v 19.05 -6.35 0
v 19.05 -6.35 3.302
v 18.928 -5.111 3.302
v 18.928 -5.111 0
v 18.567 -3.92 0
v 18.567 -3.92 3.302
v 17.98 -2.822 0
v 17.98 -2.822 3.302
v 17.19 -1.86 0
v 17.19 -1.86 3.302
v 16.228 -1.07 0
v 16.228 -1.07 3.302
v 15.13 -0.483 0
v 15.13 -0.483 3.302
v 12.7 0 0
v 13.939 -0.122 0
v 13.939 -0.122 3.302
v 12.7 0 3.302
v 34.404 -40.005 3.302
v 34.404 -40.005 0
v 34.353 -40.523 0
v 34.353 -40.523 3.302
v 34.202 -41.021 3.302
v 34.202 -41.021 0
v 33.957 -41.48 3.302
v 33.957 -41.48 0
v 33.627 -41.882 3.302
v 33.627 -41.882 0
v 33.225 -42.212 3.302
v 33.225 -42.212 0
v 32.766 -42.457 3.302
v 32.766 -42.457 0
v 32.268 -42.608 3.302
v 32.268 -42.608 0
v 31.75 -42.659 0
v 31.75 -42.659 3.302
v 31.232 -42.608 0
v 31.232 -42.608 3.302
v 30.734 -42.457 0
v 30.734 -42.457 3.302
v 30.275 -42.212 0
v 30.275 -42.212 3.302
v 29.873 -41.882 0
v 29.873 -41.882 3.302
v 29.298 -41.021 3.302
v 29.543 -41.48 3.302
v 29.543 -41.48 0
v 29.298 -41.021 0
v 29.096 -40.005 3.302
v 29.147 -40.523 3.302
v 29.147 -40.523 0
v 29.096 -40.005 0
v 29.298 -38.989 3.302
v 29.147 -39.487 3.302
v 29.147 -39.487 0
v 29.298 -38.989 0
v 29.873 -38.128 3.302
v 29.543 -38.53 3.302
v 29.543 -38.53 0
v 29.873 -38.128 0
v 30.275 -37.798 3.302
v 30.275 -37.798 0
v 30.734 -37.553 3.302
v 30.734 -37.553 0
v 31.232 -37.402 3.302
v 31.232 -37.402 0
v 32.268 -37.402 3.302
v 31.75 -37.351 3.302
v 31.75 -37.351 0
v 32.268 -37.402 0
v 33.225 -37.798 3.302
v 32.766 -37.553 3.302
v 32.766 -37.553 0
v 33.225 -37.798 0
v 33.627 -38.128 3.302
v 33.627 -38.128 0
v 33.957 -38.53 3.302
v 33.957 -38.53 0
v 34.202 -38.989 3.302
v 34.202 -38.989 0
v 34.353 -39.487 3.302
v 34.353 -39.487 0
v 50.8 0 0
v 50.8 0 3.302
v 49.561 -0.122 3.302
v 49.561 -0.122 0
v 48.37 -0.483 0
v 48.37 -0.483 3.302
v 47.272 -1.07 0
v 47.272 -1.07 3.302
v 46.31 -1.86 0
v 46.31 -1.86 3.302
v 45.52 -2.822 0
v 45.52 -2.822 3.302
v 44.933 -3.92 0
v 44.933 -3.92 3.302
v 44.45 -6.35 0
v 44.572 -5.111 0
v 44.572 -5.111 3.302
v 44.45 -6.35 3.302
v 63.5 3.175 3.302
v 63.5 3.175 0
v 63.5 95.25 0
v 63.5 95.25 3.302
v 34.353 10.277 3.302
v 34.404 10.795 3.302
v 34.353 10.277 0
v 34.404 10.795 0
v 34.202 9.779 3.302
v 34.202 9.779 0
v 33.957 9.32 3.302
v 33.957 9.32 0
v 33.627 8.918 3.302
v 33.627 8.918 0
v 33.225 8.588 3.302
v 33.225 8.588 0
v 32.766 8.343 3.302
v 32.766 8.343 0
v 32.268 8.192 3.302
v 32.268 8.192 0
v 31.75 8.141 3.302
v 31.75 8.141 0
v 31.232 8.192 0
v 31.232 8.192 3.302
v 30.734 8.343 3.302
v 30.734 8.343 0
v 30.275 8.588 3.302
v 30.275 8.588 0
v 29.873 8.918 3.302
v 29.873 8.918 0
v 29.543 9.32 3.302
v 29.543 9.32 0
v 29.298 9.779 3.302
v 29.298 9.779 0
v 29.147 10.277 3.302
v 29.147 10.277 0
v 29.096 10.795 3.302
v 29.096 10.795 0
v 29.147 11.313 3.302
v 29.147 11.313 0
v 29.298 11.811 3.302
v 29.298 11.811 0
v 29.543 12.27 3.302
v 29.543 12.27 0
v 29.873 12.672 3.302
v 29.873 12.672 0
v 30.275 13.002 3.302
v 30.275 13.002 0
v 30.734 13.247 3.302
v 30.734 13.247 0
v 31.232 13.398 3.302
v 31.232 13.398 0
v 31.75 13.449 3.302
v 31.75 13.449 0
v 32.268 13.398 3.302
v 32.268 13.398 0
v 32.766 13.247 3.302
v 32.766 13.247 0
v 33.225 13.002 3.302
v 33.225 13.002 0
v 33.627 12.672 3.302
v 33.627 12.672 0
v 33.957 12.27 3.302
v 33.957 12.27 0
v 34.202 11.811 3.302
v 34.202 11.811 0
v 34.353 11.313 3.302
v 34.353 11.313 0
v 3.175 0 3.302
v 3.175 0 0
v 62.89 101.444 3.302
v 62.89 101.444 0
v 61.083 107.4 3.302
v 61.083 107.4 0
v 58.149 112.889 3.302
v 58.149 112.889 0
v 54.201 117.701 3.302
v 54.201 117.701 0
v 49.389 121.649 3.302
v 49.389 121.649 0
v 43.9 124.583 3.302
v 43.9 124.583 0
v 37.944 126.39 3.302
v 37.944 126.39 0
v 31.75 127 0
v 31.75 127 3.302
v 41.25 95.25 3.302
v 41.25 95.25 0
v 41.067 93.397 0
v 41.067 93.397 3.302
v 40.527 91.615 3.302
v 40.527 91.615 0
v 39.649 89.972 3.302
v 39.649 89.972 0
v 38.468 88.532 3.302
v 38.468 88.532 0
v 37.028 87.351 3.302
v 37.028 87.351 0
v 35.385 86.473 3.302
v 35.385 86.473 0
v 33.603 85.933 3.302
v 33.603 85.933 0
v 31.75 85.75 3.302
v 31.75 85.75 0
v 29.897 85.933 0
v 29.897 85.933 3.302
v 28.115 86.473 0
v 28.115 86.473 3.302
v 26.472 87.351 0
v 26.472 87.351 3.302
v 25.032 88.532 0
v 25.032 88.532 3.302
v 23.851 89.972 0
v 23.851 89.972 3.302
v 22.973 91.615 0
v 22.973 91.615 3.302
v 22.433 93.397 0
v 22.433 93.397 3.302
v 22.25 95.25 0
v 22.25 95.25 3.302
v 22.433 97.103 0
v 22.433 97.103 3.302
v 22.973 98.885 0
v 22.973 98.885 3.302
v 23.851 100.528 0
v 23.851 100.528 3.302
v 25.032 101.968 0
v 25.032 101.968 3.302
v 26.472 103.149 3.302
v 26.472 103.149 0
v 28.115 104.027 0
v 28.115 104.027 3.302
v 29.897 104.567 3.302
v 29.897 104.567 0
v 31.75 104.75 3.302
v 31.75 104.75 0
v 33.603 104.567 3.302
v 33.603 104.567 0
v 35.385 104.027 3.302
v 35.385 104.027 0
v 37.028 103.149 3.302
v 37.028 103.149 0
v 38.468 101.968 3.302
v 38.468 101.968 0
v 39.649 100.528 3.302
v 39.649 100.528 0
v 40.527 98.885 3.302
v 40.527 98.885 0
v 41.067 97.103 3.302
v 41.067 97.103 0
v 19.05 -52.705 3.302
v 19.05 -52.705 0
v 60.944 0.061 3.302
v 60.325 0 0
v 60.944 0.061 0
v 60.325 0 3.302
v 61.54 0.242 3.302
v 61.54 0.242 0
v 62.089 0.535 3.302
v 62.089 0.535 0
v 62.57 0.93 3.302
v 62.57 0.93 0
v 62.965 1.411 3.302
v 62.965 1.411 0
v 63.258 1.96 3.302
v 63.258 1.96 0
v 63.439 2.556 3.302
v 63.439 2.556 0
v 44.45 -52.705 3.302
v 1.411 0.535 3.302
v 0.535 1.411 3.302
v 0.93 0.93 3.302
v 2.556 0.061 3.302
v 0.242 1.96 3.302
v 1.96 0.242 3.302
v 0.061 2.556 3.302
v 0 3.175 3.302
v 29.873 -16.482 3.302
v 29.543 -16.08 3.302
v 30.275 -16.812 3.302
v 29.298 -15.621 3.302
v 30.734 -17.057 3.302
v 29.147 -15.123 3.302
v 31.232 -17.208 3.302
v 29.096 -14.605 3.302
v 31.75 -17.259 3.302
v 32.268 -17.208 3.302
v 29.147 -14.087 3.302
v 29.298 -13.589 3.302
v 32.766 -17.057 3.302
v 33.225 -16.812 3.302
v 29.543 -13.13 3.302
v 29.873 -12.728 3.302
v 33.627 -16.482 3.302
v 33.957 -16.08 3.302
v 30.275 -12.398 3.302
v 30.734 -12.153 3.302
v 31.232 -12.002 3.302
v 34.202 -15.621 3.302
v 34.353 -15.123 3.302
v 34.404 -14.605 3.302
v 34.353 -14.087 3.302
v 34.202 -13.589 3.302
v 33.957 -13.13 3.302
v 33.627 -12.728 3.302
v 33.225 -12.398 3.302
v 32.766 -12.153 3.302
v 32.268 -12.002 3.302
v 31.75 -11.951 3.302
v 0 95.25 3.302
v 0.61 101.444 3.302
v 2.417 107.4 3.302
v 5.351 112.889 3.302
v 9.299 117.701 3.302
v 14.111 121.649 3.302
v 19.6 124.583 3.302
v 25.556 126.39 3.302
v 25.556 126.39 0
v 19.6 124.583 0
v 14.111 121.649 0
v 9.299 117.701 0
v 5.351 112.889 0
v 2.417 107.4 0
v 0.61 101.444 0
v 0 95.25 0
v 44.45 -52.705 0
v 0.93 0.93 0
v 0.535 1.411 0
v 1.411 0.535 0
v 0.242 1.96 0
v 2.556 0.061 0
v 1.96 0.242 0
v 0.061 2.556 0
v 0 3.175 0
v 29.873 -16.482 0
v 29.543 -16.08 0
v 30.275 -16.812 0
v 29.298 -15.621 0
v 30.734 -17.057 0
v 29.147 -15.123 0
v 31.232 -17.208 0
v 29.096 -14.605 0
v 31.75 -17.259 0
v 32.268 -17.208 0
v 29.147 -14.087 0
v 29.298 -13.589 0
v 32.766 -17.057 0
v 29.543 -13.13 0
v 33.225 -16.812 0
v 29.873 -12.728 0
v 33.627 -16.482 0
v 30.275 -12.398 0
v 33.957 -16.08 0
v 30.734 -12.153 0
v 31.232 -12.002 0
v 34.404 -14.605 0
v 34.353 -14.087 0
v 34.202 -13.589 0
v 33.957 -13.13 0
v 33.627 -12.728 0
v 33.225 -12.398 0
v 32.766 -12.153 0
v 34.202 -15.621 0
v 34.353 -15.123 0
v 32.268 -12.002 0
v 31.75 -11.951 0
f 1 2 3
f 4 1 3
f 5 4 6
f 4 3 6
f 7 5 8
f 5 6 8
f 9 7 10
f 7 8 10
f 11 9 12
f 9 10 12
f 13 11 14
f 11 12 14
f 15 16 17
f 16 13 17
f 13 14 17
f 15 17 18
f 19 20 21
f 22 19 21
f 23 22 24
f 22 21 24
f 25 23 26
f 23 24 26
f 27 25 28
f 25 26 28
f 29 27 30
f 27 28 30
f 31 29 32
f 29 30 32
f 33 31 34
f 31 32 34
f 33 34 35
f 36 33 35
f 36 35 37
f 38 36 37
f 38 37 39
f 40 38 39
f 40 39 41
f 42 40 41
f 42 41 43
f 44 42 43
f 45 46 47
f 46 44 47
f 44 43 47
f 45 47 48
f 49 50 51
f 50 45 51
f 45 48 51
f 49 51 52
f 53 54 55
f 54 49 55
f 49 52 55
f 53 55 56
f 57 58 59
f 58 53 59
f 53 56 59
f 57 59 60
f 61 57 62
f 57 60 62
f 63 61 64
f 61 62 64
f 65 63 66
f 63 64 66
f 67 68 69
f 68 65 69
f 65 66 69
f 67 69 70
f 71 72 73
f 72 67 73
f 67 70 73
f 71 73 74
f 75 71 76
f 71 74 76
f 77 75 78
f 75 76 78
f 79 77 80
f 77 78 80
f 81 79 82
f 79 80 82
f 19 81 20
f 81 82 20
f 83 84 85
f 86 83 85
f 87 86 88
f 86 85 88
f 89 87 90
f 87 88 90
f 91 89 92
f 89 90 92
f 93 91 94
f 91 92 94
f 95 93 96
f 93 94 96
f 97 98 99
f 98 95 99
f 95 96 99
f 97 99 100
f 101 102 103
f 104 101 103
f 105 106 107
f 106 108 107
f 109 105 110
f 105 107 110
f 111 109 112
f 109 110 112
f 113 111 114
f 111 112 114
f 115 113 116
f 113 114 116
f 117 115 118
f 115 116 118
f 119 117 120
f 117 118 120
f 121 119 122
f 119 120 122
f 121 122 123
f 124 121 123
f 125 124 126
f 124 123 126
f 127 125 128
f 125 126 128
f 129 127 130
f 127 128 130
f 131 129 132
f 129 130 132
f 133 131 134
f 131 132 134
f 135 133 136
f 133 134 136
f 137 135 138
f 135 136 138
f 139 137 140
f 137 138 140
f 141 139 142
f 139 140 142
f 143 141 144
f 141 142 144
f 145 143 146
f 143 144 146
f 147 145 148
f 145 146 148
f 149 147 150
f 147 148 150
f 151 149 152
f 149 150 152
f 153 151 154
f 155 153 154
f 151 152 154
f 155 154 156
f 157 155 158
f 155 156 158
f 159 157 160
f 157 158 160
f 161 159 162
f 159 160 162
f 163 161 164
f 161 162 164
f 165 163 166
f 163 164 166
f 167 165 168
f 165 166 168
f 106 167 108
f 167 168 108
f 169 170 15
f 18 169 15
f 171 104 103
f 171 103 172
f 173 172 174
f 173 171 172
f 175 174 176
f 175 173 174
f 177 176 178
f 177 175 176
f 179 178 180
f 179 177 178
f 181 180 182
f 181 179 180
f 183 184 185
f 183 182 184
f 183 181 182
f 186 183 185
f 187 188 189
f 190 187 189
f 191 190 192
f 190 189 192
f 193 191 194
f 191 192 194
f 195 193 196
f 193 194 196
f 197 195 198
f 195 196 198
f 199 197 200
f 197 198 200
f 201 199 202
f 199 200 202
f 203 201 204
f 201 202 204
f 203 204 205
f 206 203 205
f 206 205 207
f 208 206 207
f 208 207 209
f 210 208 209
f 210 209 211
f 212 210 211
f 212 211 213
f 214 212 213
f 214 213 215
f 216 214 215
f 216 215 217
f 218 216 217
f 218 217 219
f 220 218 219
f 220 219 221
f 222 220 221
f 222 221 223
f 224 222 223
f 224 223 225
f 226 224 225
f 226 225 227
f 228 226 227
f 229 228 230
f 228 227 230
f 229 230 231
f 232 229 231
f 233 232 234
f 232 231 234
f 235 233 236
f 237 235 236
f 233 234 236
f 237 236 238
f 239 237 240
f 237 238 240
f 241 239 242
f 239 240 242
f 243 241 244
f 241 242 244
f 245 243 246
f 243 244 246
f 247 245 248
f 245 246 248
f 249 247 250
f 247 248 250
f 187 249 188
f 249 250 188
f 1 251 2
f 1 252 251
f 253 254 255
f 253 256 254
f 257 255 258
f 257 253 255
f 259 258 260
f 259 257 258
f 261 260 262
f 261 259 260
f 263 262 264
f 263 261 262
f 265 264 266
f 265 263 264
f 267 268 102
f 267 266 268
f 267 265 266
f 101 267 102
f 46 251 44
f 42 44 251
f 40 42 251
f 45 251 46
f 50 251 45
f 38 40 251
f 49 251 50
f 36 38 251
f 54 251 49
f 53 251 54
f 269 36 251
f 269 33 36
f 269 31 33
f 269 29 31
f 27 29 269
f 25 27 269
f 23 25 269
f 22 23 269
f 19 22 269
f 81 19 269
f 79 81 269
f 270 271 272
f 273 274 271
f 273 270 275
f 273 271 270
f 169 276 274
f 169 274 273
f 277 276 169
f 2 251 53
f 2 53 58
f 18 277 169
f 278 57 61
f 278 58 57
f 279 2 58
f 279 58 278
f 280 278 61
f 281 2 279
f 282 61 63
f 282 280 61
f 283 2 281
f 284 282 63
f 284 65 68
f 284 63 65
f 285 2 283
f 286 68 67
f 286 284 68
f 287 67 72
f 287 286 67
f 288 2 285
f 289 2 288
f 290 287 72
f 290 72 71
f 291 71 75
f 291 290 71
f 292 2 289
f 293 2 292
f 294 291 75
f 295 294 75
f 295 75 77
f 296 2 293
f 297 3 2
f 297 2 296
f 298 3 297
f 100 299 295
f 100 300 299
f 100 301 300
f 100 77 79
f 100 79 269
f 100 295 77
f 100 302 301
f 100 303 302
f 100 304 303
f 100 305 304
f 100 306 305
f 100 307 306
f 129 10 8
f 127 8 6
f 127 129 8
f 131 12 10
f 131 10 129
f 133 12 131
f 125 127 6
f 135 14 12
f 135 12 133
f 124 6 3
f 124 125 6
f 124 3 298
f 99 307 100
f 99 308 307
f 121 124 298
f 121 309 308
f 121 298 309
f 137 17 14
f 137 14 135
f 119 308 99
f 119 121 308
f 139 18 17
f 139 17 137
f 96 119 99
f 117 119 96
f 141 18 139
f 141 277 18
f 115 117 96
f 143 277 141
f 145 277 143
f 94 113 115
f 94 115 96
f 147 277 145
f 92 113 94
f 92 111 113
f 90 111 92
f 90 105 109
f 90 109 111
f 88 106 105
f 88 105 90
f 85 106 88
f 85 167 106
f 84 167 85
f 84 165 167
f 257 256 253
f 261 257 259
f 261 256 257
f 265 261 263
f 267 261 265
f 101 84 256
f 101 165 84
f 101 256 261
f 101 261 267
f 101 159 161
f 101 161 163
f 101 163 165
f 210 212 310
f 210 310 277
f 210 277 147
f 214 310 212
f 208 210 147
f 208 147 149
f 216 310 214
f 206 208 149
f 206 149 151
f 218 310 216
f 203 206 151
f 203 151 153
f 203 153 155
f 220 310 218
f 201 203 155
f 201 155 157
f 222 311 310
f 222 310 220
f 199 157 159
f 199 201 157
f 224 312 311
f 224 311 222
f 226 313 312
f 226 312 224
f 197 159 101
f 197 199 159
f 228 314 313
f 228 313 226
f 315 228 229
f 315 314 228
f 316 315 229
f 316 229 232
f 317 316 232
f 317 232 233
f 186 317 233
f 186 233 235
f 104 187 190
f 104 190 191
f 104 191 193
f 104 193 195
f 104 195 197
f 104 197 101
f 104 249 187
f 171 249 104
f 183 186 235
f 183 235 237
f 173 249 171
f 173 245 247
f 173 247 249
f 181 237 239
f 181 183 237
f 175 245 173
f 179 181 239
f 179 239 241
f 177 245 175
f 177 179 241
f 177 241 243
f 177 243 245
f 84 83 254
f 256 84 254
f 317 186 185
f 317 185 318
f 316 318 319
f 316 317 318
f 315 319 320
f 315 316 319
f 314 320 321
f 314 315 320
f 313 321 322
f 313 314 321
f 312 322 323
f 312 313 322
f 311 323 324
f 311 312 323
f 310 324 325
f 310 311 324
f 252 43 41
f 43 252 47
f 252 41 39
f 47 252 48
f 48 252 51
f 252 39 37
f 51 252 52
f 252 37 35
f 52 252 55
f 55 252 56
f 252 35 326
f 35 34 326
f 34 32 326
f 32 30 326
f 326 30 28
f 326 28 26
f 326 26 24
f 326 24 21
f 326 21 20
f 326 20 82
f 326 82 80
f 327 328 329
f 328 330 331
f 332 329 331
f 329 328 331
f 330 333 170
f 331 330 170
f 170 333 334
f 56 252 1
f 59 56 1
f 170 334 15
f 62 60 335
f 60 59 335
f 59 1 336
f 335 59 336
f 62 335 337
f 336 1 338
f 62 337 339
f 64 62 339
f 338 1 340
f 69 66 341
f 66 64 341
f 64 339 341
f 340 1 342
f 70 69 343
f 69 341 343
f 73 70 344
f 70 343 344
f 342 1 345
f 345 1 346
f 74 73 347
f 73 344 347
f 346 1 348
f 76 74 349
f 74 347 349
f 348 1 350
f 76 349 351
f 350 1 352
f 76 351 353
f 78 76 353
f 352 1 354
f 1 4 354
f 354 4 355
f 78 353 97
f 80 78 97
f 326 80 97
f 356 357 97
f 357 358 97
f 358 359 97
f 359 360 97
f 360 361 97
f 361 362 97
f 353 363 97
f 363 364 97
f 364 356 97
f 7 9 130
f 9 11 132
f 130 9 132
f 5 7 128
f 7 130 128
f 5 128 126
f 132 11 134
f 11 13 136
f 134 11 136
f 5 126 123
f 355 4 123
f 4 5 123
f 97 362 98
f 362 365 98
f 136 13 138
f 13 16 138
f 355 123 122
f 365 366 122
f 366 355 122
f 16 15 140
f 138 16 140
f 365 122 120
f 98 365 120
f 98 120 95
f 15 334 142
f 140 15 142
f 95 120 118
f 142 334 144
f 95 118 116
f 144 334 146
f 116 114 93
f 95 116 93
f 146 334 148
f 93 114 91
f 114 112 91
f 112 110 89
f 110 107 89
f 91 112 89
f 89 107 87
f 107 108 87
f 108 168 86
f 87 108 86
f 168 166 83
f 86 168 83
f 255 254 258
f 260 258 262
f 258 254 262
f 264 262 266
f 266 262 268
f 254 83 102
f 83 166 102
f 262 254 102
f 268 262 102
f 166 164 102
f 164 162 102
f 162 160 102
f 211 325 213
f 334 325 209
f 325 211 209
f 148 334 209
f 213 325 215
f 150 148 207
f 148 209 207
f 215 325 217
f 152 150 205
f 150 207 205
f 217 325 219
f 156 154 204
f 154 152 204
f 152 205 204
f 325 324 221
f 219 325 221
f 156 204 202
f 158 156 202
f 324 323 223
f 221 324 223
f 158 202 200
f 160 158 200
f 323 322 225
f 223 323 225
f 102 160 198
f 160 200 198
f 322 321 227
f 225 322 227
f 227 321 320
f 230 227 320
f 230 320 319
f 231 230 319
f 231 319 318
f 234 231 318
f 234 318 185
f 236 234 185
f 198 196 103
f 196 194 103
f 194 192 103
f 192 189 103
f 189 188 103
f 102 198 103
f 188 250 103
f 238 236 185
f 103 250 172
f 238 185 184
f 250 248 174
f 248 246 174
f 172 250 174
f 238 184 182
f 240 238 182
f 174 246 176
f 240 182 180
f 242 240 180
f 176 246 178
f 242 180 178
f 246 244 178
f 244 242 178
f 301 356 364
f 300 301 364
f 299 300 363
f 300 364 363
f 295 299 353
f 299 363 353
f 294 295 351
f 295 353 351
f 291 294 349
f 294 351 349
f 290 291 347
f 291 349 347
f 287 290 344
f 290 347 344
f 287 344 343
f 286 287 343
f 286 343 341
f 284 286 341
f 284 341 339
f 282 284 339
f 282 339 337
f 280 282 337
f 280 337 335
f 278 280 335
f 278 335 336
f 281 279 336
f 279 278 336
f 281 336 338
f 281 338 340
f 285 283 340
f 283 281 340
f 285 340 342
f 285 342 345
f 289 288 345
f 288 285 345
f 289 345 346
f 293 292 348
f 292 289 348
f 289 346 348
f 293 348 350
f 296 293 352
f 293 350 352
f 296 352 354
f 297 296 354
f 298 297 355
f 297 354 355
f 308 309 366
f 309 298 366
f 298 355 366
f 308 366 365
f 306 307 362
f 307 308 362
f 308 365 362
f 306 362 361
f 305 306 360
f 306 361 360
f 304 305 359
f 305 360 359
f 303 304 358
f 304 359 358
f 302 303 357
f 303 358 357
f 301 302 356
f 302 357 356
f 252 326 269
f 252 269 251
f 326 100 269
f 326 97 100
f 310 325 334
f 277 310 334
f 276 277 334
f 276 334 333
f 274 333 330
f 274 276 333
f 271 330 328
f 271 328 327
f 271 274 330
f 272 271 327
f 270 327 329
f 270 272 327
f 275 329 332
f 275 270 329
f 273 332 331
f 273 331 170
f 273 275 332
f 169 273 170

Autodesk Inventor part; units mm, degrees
ref_plane "YZ Plane" through (0, 0, 0) normal (1, 0, 0) x (0, 1, 0)
ref_plane "XZ Plane" through (0, 0, 0) normal (0, 1, 0) x (-1, 0, 0)
ref_plane "XY Plane" through (0, 0, 0) normal (0, 0, 1) x (1, 0, 0)
sketch "Sketch1" plane through (0, 0, 0) normal (0, 0, 1) x (1, 0, 0)
  line L0 (0, 0) -> (63.5, 0)
  line L1 (63.5, 0) -> (63.5, 127)
  line L2 (63.5, 127) -> (0, 127)
  line L3 (0, 127) -> (0, 0)
  circle A0 centre (31.75, 95.25) radius 9.5
  circle A1 centre (31.75, 10.795) radius 2.6543
  circle A2 centre (31.75, -14.605) radius 2.6543
  line L4 (31.75, 115.6989) -> (31.75, 0)
  circle A3 centre (31.75, -40.005) radius 2.6543
  line L5 (44.45, 39.5543) -> (44.45, -52.705)
  line L6 (44.45, -52.705) -> (19.05, -52.705)
  line L7 (19.05, -52.705) -> (19.05, 39.5543)
  line L8 (44.45, 39.5543) -> (19.05, 39.5543)
  line L9 (0, 30.254) -> (63.5, 30.254)
  point P0 (44.45, 0)
  point P1 (19.05, 0)
  point P2 (31.75, -52.705)
  dimension "d0" = 63.5
  dimension "d1" = 127
  dimension "d2" = 19
  dimension "d3" = 5.3086
  dimension "d4" = 5.3086
  dimension "d5" = 31.75
  dimension "d6" = 116.205
  dimension "d14" = 25.4
  dimension "d15" = 25.4
  dimension "d17" = 25.4
  dimension "d20" = 39.5543
  dimension "d21" = 12.7
extrude "Extrusion1" add sketch "Sketch1" along normal blind 3.302 contours L3 L9 L7 L0 | L7 L9 L4 A1 L0 | L0 L5 L6 L7 | L3 L2 L1 L9 L5 L8 L7 | L4 A1 L9 L5 L0 | L7 L8 L4 L9 | L5 L9 L1 L0 | L4 L8 L5 L9
fillet "Fillet1" radius 31.75 1 edges at (63.5, 127, 1.651)
fillet "Fillet2" radius 31.75 1 edges at (0, 127, 1.651)
fillet "Fillet3" radius 3.175 1 edges at (63.5, 0, 1.651)
fillet "Fillet4" radius 3.175 1 edges at (0, 0, 1.651)
fillet "Fillet5" radius 6.35 2 edges at (19.05, 0, 1.651) (44.45, 0, 1.651)
properties part number "Wrist plate"
